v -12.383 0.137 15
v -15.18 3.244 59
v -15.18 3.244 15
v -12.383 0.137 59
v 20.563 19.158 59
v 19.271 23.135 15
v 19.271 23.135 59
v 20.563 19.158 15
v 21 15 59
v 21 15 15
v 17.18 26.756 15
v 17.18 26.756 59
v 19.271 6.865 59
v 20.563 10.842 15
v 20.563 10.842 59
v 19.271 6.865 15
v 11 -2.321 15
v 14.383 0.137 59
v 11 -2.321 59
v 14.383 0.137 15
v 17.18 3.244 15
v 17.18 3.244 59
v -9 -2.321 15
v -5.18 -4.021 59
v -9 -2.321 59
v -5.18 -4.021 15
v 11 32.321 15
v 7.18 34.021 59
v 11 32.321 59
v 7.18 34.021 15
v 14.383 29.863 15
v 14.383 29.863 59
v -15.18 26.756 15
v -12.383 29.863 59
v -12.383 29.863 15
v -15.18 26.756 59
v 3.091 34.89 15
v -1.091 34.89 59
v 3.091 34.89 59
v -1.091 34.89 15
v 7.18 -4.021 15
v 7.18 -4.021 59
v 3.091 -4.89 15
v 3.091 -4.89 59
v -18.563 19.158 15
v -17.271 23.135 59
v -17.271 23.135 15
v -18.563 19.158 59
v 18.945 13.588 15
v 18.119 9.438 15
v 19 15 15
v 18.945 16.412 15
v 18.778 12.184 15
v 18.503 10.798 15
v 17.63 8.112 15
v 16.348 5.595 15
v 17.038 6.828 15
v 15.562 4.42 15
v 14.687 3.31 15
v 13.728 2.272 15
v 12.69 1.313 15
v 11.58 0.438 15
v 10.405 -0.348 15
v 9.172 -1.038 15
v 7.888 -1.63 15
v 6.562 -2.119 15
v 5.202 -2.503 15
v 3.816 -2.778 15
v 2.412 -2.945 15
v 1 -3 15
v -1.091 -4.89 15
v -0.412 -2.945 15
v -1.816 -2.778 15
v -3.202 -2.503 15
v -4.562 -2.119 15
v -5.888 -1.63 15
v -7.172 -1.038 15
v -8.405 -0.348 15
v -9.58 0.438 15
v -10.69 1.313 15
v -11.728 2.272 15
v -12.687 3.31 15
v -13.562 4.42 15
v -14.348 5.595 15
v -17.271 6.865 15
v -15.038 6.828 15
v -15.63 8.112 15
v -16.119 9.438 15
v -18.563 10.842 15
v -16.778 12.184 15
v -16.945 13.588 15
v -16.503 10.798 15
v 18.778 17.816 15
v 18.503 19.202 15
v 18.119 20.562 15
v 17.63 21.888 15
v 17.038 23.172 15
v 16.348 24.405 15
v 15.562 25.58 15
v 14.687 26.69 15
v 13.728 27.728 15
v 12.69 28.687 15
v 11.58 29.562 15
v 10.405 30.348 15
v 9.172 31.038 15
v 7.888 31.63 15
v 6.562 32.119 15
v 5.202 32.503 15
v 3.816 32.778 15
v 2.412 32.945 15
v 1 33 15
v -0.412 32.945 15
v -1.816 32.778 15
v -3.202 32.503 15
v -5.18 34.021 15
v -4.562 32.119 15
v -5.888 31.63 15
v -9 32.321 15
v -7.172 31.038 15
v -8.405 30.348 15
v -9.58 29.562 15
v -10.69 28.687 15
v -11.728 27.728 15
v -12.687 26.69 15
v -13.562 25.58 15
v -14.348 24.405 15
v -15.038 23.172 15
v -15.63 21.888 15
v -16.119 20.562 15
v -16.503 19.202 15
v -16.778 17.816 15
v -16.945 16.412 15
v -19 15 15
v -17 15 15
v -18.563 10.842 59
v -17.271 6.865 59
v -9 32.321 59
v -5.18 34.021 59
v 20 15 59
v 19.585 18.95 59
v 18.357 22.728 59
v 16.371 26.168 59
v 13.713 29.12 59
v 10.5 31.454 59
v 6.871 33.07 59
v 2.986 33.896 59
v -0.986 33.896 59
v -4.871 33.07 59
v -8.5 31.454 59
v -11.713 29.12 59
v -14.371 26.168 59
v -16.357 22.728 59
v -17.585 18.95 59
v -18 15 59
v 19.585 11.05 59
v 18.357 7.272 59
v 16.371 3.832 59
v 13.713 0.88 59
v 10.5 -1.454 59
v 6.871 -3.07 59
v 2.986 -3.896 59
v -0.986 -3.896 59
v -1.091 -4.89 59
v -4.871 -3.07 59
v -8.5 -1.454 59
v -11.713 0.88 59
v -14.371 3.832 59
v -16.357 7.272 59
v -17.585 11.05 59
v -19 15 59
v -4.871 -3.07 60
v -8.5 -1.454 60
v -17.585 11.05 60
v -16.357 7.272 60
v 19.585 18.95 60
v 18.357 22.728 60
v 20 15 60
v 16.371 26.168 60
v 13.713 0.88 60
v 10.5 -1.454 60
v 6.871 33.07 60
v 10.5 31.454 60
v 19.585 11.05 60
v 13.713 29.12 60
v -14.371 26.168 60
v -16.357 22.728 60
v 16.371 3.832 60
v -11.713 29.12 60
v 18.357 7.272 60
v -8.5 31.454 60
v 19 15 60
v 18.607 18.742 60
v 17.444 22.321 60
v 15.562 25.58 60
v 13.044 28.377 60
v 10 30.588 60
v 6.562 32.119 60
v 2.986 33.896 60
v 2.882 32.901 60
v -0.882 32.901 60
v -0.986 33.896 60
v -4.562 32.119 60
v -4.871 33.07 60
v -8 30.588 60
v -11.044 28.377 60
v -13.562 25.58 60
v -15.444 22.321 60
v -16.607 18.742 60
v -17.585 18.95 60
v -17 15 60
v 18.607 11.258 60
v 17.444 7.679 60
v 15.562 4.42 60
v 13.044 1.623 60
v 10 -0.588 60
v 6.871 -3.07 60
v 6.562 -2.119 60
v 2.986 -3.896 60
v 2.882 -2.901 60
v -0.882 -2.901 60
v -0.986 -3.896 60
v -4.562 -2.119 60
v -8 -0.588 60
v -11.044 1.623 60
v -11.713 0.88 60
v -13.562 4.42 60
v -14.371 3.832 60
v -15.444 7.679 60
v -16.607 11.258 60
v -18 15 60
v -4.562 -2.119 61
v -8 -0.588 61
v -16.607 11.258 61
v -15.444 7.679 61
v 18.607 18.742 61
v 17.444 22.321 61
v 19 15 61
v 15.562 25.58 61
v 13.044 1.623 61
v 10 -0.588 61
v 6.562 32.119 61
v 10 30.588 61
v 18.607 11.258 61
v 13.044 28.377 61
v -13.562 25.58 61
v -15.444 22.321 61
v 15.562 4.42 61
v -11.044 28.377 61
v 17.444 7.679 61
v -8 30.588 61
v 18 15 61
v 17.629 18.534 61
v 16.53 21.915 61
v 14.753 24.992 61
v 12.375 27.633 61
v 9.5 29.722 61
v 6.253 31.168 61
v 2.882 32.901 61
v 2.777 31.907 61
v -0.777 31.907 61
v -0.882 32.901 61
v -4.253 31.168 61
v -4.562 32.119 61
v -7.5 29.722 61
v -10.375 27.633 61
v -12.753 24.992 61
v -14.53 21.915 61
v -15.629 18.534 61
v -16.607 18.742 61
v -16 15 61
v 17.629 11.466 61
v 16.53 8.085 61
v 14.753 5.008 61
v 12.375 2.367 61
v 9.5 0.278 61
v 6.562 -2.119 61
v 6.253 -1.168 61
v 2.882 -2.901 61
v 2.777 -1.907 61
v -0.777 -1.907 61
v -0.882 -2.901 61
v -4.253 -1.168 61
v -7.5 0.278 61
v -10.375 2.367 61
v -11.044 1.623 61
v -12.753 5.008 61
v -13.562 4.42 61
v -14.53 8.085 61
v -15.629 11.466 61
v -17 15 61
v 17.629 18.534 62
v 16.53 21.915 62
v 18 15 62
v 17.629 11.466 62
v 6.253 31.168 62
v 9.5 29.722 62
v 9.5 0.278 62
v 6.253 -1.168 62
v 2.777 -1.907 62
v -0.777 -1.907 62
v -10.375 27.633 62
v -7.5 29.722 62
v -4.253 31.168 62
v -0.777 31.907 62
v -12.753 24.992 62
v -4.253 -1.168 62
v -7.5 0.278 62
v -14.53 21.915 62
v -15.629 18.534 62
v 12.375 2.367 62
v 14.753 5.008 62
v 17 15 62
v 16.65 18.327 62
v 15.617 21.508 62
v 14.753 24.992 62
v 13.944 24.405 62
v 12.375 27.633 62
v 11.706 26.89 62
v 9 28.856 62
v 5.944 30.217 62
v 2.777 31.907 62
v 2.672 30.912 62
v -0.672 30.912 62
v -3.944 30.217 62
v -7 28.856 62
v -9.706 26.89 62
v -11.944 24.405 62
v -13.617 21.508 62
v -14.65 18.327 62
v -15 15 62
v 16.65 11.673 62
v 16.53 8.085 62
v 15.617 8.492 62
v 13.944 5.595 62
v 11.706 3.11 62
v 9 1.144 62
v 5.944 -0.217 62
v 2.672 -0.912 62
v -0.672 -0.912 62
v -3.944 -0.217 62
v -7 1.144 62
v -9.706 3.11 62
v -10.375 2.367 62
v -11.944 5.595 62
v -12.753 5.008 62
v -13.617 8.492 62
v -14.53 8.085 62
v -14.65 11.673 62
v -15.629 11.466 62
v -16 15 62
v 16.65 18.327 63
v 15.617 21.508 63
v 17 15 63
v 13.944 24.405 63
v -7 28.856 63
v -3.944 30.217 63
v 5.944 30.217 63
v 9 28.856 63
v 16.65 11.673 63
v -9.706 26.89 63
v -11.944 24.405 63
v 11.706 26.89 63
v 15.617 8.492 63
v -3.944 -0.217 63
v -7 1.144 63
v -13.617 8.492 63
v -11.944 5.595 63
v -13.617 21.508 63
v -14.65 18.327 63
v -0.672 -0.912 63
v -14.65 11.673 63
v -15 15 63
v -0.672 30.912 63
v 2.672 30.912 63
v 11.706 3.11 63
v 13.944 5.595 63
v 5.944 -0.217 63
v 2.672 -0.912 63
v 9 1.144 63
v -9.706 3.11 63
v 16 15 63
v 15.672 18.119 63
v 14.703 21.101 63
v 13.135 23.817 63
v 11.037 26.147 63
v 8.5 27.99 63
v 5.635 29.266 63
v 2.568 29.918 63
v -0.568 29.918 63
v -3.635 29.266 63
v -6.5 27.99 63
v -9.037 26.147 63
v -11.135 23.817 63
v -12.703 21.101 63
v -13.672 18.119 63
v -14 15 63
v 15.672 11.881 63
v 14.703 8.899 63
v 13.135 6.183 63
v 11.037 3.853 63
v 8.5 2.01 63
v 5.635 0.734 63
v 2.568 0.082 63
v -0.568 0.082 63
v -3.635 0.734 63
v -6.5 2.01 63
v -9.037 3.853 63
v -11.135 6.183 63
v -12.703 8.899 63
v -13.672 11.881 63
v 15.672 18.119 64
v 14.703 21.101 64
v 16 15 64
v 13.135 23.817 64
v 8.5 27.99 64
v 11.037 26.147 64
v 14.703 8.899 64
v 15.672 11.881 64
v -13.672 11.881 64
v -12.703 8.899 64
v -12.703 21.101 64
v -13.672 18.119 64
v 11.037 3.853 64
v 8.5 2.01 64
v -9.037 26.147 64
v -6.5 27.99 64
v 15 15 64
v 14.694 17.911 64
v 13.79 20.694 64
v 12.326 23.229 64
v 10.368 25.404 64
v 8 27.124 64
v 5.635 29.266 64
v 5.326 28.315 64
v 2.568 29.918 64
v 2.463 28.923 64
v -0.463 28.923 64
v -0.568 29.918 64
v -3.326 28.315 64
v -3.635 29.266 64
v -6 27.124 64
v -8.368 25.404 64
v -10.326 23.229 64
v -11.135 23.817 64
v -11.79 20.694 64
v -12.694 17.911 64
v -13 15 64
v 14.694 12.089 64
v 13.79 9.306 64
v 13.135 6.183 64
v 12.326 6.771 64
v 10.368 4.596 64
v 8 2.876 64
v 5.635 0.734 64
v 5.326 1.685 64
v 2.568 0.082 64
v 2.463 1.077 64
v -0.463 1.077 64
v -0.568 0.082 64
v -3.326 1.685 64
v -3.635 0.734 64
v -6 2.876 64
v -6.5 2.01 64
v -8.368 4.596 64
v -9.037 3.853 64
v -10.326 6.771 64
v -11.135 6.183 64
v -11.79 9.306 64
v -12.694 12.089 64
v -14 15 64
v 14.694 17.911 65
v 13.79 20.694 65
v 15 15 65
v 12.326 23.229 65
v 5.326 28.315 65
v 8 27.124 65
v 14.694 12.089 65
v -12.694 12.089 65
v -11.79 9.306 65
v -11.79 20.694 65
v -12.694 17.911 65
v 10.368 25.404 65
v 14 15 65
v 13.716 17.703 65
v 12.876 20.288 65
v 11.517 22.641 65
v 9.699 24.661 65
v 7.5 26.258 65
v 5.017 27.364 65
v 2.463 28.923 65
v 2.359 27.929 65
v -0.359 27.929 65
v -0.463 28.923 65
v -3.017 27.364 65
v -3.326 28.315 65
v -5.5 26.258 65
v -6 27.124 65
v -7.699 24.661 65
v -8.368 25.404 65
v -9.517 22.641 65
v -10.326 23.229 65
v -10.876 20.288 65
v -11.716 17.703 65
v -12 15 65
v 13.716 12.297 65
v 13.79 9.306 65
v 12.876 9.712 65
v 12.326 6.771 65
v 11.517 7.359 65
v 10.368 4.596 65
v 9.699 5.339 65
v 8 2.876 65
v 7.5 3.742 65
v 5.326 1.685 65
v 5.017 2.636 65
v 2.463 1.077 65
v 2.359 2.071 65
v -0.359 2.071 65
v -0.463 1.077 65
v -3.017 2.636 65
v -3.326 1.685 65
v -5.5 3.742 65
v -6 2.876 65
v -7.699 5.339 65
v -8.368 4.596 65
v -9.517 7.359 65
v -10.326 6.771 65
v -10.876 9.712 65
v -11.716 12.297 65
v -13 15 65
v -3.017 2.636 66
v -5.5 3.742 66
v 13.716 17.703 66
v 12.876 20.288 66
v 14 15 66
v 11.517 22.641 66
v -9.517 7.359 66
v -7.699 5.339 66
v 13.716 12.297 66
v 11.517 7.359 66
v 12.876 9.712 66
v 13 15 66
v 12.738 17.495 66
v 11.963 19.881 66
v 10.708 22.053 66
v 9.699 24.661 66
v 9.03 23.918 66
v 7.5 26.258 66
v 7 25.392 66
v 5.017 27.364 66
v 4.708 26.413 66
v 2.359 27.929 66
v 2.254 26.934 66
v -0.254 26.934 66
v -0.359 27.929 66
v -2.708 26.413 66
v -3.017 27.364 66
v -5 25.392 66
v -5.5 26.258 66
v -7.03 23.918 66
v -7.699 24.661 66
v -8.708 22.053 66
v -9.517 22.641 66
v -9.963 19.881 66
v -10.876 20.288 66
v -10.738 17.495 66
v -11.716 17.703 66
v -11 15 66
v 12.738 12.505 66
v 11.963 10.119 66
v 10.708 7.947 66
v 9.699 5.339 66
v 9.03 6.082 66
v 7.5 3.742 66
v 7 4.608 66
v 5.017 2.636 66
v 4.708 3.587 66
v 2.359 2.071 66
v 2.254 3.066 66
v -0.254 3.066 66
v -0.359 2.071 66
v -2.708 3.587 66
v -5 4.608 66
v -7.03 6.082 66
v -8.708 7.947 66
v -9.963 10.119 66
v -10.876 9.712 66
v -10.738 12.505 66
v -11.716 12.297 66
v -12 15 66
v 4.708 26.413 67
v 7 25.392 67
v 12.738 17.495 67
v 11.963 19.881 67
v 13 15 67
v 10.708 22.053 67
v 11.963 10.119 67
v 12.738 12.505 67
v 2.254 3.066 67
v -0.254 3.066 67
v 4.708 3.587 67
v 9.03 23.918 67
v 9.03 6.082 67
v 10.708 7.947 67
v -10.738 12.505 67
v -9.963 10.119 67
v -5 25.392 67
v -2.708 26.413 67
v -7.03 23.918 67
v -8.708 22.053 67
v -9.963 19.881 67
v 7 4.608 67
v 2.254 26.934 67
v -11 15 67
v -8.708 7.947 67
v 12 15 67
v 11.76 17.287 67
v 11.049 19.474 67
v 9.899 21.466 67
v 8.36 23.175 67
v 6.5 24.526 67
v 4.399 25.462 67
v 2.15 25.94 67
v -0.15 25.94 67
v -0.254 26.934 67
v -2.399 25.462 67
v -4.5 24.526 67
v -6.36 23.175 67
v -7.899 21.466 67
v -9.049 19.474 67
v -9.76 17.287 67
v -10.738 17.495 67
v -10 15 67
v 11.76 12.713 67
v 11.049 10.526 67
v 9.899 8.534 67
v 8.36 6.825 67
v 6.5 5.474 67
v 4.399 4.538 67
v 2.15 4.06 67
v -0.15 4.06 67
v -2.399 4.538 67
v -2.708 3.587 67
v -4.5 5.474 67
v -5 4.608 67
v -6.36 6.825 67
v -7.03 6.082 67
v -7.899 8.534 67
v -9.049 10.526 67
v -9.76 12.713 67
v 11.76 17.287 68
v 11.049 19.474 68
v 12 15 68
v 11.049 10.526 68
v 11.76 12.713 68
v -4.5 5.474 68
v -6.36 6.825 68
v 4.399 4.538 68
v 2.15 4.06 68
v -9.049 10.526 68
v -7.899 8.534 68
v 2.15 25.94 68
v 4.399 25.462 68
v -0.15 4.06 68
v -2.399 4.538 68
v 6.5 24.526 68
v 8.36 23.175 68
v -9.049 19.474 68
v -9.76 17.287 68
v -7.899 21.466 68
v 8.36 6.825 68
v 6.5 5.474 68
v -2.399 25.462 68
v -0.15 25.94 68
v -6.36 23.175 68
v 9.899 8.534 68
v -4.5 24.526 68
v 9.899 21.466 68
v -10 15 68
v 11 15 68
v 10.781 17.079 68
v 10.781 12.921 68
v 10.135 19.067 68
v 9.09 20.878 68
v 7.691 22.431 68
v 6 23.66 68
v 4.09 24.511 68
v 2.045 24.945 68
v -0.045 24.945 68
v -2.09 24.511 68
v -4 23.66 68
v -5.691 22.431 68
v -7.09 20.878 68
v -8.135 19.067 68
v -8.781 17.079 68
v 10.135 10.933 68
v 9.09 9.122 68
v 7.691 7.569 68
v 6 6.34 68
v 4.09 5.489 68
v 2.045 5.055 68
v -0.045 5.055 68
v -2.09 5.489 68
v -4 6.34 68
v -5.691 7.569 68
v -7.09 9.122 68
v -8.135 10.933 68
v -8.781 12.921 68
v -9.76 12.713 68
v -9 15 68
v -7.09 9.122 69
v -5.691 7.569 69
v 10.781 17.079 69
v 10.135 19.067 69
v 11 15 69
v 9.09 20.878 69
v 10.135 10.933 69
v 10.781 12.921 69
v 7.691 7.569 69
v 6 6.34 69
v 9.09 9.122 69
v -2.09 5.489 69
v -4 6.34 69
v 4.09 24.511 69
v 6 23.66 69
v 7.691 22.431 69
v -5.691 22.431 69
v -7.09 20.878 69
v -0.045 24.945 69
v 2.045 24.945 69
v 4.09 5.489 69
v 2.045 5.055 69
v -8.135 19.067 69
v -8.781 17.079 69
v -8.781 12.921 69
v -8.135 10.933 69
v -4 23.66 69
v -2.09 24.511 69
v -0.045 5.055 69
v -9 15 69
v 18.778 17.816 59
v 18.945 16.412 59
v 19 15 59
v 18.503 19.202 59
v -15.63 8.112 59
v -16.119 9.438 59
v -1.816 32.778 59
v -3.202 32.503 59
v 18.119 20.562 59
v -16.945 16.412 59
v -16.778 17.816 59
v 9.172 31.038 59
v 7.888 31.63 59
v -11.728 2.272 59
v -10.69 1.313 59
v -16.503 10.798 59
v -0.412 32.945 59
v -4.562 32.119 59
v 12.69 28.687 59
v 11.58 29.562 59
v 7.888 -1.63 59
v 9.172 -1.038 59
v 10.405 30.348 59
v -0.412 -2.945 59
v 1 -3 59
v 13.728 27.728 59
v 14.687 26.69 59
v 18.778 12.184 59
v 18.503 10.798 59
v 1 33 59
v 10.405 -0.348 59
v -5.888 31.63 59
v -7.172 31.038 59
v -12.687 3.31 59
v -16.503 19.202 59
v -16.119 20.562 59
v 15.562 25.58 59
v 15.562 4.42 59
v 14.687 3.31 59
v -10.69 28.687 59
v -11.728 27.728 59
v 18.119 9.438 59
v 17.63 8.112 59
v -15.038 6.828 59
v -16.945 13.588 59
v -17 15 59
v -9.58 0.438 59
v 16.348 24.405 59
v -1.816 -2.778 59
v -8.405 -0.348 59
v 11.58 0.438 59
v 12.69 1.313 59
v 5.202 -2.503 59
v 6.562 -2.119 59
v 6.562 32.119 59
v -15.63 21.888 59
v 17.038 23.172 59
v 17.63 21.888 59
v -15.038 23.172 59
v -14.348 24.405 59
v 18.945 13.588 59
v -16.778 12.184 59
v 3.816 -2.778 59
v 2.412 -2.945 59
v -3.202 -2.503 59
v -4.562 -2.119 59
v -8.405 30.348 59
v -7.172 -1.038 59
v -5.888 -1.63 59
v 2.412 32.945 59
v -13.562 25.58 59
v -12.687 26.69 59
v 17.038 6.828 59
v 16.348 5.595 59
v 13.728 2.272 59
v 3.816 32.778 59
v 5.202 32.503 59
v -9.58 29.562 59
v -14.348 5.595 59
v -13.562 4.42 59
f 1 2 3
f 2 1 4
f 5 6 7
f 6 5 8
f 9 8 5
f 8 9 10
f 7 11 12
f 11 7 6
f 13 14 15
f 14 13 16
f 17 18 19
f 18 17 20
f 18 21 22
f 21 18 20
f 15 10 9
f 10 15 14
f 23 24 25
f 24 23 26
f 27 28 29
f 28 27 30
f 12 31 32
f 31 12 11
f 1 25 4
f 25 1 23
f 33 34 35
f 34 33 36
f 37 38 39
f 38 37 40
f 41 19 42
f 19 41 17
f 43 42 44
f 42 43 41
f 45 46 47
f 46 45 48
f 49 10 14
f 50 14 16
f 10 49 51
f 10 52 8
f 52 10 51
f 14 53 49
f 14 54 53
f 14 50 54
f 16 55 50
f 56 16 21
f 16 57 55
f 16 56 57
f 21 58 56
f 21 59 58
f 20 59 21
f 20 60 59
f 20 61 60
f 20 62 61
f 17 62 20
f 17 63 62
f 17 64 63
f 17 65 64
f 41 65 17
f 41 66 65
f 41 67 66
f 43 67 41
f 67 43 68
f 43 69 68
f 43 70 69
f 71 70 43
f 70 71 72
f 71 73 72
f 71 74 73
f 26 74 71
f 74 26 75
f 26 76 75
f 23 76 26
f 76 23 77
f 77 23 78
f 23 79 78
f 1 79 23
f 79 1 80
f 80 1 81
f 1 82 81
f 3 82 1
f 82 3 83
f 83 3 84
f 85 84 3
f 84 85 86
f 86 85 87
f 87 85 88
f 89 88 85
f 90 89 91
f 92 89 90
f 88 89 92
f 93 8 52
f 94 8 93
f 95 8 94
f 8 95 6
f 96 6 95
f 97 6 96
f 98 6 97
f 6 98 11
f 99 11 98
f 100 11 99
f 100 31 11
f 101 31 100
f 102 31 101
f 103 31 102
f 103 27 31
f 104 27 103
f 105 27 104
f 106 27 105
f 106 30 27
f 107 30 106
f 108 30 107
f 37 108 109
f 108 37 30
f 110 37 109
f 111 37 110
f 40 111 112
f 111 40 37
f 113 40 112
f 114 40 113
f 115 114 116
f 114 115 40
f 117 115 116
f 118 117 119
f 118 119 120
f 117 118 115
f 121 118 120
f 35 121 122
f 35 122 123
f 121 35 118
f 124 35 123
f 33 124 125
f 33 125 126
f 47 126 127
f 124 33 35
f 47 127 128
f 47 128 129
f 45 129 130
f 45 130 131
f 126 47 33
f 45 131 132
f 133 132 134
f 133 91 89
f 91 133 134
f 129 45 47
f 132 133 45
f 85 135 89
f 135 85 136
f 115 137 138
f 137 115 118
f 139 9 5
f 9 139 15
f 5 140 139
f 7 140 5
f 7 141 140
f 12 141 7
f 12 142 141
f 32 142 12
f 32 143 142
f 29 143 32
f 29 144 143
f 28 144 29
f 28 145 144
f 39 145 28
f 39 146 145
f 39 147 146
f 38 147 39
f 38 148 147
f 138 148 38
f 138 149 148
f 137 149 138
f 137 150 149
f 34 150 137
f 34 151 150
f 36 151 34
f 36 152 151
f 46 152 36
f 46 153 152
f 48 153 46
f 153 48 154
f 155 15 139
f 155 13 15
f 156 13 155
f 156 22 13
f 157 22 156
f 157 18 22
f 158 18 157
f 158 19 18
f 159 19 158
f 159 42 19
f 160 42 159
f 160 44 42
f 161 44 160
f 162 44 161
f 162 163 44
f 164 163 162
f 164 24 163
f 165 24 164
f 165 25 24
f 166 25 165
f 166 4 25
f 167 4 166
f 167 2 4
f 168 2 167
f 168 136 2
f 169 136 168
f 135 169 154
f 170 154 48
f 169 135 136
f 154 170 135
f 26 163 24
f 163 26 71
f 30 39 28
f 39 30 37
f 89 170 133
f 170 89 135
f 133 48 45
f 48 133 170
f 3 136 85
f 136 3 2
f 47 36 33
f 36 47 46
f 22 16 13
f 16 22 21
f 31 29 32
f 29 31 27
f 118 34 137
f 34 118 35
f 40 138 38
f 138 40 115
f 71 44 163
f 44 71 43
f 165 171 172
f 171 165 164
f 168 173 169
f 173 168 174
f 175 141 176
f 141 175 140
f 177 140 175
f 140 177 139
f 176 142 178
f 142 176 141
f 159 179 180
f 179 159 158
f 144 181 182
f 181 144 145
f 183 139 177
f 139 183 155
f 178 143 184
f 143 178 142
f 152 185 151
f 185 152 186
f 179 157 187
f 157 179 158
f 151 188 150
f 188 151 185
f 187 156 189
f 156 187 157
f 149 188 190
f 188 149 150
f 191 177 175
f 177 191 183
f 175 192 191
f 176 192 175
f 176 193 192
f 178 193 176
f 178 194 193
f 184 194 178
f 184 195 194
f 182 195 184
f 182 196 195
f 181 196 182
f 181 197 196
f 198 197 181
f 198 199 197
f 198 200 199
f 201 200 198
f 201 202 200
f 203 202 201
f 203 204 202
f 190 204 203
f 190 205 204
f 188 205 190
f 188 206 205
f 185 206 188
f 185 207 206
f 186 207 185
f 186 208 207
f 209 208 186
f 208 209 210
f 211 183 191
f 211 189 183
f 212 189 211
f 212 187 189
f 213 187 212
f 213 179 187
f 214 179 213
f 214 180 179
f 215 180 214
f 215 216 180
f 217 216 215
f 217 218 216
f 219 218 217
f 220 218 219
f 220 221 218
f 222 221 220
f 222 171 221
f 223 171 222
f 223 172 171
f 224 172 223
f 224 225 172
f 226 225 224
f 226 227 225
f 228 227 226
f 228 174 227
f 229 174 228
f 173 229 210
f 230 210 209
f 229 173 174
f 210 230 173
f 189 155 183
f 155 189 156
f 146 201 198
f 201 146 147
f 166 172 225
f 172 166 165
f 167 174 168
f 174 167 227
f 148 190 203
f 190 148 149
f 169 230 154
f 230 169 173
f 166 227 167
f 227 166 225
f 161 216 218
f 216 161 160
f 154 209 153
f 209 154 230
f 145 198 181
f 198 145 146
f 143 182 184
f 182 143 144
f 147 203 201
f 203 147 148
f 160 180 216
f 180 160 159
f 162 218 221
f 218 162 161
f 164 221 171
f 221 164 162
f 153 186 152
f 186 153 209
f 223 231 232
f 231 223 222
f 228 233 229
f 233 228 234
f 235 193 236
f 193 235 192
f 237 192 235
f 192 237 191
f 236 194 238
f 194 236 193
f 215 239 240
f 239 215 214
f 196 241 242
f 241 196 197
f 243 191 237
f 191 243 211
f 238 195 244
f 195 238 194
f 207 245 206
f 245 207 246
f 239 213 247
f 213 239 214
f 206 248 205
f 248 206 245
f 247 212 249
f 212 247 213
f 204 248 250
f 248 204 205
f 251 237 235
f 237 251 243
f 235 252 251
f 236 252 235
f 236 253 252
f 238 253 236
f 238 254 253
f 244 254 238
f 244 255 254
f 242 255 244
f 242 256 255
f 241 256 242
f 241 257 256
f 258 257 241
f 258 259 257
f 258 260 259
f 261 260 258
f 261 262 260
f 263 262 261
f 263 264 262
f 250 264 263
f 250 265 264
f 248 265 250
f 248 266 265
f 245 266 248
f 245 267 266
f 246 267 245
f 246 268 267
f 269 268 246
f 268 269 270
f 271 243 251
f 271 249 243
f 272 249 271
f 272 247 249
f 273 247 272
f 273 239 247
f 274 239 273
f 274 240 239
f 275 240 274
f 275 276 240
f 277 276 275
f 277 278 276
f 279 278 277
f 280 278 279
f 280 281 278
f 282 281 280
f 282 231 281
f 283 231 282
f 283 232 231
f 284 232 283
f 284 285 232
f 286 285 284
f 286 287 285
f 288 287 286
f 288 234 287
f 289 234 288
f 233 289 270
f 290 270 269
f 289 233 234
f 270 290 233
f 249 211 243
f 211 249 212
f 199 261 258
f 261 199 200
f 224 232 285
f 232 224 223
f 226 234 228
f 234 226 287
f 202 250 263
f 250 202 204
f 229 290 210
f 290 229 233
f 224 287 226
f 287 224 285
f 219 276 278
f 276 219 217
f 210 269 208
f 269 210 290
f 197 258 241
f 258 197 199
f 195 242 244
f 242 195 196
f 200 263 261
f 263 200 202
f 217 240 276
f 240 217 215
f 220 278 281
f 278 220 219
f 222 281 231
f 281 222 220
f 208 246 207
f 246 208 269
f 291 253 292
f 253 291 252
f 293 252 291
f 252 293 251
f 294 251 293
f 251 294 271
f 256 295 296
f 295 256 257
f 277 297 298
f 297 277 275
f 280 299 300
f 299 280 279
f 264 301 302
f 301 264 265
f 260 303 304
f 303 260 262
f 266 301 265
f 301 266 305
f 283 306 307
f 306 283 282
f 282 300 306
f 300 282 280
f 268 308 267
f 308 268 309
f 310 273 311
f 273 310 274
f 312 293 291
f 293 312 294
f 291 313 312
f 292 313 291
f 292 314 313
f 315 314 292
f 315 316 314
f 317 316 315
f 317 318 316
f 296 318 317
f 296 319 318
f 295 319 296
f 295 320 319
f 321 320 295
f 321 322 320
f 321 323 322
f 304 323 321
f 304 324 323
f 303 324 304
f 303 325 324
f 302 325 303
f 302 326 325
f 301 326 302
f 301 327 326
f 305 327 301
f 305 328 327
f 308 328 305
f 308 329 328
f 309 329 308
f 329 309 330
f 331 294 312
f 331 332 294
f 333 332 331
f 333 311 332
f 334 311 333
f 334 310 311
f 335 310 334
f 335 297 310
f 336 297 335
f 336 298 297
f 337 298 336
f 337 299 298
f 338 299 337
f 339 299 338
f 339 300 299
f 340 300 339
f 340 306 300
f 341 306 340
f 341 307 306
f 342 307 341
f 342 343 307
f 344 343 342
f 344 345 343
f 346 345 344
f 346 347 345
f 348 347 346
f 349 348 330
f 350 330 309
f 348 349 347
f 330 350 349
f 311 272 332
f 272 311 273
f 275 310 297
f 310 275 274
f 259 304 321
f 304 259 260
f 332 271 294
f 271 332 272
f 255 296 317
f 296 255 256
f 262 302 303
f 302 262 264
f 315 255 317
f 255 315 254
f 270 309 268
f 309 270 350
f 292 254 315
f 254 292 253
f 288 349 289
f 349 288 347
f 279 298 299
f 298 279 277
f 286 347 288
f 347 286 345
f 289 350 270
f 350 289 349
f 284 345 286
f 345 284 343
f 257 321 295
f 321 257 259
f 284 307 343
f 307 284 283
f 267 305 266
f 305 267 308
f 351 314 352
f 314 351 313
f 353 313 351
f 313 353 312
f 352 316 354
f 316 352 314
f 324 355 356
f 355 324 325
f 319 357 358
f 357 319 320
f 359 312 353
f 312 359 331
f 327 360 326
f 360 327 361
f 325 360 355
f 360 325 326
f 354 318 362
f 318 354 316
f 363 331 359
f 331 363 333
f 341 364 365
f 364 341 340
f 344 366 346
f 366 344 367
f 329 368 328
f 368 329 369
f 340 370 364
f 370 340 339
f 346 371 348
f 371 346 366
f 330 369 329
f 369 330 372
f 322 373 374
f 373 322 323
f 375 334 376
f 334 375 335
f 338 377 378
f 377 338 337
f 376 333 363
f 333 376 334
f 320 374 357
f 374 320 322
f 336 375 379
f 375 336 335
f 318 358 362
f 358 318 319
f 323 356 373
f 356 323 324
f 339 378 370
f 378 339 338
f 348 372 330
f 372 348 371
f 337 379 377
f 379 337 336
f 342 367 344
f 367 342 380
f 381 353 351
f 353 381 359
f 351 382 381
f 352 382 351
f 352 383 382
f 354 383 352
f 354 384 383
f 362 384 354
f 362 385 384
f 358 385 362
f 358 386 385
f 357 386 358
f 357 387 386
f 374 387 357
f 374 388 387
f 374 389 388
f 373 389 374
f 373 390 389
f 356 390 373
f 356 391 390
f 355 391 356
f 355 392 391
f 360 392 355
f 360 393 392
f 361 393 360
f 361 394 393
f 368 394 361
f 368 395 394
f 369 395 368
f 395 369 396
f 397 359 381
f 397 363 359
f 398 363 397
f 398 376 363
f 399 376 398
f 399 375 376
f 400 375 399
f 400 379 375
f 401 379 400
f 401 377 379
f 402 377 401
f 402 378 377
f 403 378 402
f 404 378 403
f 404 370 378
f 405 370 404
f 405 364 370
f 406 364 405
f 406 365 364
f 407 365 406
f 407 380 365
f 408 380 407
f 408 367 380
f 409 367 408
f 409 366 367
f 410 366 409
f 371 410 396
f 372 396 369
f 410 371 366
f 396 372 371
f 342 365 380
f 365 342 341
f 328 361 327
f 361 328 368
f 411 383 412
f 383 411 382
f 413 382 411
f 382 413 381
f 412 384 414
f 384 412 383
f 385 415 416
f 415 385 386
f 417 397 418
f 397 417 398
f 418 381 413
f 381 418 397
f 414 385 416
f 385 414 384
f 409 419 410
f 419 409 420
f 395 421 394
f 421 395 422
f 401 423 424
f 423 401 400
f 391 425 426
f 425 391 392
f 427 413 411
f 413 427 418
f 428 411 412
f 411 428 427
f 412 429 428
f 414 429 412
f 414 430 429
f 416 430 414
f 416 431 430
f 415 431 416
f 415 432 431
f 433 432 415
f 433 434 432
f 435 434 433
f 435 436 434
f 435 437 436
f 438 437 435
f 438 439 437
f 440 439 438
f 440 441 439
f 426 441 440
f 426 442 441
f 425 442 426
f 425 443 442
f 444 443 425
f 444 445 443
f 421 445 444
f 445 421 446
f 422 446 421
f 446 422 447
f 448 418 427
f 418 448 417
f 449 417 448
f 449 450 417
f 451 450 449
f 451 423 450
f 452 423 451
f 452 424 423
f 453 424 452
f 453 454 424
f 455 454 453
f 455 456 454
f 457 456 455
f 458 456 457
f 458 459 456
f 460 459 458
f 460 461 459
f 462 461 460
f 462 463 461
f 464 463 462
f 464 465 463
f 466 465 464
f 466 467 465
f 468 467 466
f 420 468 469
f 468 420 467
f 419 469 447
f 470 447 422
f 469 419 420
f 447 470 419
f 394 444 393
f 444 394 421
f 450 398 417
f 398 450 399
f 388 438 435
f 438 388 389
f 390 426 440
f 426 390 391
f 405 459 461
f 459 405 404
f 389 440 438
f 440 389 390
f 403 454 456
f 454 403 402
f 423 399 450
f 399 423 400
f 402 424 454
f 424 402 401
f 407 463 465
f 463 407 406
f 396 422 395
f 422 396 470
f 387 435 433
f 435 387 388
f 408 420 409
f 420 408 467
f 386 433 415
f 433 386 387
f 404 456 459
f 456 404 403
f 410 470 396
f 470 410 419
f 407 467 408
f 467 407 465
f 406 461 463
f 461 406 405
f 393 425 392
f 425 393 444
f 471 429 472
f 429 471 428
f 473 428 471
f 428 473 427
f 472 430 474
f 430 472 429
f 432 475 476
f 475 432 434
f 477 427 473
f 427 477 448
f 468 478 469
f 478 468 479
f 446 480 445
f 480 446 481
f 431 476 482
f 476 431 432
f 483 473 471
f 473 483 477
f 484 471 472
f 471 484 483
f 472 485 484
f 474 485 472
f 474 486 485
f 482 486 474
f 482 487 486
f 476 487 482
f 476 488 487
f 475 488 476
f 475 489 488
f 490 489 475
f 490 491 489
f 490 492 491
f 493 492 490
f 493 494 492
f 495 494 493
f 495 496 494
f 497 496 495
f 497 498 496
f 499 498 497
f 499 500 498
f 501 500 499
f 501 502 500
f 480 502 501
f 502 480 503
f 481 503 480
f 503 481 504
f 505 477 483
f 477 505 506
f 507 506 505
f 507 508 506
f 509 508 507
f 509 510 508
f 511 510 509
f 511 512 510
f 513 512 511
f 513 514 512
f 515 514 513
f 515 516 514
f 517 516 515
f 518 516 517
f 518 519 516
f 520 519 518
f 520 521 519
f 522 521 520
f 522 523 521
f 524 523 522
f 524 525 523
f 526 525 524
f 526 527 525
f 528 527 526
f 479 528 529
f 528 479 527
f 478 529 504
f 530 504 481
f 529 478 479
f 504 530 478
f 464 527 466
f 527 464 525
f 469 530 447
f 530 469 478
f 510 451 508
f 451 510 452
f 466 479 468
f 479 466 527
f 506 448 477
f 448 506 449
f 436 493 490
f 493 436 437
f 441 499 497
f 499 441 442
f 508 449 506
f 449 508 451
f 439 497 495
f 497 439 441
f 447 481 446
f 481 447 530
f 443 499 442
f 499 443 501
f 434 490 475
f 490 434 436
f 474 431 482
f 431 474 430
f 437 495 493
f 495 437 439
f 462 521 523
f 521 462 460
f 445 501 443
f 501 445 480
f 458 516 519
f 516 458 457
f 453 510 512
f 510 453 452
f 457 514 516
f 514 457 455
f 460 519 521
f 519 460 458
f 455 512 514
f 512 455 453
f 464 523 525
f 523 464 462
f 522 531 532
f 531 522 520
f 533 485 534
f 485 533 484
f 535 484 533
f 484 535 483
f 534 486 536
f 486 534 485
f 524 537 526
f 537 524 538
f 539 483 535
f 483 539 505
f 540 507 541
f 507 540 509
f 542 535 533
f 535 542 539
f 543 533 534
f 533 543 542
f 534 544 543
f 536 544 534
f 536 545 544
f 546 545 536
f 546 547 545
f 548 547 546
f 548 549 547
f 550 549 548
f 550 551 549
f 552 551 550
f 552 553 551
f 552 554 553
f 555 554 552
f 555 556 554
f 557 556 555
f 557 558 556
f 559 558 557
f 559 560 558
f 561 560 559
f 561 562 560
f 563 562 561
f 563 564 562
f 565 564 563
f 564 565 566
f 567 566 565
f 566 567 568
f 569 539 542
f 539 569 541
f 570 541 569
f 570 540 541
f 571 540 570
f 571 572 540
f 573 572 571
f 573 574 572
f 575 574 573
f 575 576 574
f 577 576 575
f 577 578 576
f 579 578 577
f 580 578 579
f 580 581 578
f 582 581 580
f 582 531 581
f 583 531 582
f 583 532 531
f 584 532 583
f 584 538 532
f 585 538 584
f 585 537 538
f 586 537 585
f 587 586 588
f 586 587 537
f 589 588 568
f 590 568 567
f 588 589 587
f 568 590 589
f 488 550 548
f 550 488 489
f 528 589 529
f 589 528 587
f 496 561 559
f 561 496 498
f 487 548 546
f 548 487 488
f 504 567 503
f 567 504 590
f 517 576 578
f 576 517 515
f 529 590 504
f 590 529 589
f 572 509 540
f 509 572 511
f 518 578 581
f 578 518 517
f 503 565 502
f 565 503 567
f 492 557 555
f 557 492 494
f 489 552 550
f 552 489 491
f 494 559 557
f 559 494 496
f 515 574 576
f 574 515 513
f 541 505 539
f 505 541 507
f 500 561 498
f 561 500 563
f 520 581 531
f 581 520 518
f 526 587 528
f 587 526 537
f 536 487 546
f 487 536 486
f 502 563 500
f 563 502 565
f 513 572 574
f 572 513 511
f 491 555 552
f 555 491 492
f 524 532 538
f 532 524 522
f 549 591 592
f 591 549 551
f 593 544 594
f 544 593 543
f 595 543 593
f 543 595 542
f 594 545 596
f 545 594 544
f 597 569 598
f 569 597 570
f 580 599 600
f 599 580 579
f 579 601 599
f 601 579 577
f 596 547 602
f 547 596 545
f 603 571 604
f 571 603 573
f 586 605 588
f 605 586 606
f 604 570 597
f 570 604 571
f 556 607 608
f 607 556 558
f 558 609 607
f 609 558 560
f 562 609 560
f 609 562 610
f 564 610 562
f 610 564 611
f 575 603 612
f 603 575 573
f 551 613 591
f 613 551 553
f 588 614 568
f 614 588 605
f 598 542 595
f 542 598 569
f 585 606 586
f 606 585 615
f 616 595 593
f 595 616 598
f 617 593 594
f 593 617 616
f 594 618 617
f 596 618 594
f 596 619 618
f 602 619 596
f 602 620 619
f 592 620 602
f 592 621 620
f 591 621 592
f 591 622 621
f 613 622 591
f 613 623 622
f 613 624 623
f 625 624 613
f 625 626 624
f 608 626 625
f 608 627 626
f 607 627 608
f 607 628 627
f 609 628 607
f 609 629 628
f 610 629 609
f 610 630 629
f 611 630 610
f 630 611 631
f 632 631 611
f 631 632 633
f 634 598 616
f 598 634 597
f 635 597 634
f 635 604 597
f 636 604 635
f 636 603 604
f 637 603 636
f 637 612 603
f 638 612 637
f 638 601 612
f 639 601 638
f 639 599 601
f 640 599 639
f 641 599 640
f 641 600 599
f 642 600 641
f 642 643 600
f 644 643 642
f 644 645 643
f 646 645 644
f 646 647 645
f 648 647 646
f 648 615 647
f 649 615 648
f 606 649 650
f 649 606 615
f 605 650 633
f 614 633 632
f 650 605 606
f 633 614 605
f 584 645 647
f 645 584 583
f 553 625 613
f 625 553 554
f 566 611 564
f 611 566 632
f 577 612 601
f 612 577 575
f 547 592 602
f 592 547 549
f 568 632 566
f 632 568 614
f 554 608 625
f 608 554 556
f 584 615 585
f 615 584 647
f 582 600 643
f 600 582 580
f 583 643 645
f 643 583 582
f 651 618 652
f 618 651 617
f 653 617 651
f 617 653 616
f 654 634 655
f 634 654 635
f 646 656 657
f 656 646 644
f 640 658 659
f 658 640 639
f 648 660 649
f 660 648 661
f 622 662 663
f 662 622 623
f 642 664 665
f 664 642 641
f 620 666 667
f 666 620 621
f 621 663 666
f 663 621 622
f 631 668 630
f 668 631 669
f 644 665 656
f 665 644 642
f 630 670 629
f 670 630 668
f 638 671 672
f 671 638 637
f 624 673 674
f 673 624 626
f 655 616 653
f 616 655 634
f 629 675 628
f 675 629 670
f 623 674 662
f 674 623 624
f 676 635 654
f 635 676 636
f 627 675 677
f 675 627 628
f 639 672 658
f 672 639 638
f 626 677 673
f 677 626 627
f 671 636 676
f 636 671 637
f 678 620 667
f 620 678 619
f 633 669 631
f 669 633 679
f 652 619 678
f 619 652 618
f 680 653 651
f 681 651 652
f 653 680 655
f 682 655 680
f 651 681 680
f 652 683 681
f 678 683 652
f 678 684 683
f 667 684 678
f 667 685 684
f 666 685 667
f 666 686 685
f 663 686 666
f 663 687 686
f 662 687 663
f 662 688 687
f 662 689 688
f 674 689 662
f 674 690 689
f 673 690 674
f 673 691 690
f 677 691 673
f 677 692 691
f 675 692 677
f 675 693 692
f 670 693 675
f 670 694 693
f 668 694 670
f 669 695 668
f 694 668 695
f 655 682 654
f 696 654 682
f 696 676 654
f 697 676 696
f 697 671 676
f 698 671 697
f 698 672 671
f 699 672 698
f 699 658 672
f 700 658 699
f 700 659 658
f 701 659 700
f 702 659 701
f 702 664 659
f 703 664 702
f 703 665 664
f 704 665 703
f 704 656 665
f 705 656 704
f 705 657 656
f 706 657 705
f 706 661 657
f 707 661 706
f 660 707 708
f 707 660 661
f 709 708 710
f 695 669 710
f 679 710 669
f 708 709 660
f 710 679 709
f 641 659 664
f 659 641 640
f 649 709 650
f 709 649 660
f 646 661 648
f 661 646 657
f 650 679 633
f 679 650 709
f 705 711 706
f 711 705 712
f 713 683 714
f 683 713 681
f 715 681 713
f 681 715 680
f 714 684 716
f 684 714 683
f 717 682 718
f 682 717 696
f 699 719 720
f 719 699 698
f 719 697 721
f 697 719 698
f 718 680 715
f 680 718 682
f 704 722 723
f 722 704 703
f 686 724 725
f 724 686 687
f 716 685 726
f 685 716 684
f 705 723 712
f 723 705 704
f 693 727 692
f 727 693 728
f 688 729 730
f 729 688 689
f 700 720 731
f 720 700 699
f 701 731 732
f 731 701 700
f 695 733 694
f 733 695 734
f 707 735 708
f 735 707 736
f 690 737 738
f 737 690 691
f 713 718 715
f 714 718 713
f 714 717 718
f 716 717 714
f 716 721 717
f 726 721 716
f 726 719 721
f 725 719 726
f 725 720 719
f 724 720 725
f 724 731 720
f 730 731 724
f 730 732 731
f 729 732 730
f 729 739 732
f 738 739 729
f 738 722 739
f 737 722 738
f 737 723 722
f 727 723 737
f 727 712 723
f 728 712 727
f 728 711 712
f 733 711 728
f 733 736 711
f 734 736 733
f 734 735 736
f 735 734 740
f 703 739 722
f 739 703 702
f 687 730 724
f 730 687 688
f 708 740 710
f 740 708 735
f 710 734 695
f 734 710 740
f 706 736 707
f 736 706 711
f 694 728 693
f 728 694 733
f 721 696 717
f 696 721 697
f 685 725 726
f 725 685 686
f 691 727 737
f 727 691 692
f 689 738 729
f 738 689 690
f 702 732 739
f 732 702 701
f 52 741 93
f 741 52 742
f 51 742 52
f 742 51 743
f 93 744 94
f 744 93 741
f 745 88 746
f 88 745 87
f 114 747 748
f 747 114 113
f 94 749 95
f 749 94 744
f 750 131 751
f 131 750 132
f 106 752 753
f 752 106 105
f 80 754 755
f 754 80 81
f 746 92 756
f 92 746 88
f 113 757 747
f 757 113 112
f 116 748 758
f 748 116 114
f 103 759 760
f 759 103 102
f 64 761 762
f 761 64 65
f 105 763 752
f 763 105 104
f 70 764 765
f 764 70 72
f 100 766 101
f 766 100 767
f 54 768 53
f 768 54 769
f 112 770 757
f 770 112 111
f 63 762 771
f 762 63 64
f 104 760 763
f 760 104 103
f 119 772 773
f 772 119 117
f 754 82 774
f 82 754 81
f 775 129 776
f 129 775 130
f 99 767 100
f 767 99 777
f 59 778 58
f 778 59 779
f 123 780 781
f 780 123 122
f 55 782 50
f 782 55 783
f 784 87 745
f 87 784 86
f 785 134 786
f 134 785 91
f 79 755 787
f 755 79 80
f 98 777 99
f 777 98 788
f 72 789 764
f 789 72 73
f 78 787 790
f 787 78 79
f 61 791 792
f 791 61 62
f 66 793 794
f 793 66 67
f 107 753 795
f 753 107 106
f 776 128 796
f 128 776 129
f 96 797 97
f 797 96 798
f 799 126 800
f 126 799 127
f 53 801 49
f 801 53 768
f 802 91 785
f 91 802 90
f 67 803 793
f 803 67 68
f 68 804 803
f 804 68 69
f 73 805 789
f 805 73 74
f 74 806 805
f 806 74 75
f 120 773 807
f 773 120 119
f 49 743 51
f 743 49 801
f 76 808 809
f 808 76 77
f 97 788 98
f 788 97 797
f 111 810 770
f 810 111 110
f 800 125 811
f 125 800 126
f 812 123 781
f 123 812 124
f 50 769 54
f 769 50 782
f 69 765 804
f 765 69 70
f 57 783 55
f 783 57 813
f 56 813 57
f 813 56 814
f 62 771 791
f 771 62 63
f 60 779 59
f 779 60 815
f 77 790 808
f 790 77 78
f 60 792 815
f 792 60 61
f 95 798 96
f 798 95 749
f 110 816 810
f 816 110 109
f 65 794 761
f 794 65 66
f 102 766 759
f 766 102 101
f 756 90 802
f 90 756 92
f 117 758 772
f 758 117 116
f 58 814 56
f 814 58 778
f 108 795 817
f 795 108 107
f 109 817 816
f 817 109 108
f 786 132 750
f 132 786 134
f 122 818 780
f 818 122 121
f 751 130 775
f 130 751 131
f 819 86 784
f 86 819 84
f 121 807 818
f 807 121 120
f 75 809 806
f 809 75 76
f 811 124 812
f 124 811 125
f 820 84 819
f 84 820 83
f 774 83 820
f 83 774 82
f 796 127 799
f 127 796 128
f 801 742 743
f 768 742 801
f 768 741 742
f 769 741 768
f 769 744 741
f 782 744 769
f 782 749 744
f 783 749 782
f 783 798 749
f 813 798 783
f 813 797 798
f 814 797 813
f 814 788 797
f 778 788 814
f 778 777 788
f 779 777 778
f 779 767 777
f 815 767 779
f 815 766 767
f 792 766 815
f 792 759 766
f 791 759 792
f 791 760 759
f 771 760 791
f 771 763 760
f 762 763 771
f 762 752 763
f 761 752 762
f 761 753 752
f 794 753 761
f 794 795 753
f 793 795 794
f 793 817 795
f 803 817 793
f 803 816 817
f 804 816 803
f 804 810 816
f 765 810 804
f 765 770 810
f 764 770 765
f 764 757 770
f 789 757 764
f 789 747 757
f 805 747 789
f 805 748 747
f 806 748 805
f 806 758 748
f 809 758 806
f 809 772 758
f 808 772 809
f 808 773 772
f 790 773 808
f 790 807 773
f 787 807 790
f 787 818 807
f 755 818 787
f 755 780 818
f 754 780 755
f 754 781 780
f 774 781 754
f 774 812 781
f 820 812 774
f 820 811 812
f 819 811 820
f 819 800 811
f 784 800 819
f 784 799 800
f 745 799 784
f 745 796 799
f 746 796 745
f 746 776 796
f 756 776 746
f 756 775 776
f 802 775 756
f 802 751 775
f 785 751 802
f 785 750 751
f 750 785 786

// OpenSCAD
hight = 60;
width = 18;
size = 10;
cup (60,18,10);

module cup (hight, width, size) {
difference(){
		translate([1,15,15]) 
		for(d = [0:10]){
			translate([0,0,d ])
			cylinder(h=hight-16, r=(20-d ), fn = 30); 
		}
		translate([1,15,15])
		cylinder(h=hight-16, r=width, $fn = 80);	
	}
}
